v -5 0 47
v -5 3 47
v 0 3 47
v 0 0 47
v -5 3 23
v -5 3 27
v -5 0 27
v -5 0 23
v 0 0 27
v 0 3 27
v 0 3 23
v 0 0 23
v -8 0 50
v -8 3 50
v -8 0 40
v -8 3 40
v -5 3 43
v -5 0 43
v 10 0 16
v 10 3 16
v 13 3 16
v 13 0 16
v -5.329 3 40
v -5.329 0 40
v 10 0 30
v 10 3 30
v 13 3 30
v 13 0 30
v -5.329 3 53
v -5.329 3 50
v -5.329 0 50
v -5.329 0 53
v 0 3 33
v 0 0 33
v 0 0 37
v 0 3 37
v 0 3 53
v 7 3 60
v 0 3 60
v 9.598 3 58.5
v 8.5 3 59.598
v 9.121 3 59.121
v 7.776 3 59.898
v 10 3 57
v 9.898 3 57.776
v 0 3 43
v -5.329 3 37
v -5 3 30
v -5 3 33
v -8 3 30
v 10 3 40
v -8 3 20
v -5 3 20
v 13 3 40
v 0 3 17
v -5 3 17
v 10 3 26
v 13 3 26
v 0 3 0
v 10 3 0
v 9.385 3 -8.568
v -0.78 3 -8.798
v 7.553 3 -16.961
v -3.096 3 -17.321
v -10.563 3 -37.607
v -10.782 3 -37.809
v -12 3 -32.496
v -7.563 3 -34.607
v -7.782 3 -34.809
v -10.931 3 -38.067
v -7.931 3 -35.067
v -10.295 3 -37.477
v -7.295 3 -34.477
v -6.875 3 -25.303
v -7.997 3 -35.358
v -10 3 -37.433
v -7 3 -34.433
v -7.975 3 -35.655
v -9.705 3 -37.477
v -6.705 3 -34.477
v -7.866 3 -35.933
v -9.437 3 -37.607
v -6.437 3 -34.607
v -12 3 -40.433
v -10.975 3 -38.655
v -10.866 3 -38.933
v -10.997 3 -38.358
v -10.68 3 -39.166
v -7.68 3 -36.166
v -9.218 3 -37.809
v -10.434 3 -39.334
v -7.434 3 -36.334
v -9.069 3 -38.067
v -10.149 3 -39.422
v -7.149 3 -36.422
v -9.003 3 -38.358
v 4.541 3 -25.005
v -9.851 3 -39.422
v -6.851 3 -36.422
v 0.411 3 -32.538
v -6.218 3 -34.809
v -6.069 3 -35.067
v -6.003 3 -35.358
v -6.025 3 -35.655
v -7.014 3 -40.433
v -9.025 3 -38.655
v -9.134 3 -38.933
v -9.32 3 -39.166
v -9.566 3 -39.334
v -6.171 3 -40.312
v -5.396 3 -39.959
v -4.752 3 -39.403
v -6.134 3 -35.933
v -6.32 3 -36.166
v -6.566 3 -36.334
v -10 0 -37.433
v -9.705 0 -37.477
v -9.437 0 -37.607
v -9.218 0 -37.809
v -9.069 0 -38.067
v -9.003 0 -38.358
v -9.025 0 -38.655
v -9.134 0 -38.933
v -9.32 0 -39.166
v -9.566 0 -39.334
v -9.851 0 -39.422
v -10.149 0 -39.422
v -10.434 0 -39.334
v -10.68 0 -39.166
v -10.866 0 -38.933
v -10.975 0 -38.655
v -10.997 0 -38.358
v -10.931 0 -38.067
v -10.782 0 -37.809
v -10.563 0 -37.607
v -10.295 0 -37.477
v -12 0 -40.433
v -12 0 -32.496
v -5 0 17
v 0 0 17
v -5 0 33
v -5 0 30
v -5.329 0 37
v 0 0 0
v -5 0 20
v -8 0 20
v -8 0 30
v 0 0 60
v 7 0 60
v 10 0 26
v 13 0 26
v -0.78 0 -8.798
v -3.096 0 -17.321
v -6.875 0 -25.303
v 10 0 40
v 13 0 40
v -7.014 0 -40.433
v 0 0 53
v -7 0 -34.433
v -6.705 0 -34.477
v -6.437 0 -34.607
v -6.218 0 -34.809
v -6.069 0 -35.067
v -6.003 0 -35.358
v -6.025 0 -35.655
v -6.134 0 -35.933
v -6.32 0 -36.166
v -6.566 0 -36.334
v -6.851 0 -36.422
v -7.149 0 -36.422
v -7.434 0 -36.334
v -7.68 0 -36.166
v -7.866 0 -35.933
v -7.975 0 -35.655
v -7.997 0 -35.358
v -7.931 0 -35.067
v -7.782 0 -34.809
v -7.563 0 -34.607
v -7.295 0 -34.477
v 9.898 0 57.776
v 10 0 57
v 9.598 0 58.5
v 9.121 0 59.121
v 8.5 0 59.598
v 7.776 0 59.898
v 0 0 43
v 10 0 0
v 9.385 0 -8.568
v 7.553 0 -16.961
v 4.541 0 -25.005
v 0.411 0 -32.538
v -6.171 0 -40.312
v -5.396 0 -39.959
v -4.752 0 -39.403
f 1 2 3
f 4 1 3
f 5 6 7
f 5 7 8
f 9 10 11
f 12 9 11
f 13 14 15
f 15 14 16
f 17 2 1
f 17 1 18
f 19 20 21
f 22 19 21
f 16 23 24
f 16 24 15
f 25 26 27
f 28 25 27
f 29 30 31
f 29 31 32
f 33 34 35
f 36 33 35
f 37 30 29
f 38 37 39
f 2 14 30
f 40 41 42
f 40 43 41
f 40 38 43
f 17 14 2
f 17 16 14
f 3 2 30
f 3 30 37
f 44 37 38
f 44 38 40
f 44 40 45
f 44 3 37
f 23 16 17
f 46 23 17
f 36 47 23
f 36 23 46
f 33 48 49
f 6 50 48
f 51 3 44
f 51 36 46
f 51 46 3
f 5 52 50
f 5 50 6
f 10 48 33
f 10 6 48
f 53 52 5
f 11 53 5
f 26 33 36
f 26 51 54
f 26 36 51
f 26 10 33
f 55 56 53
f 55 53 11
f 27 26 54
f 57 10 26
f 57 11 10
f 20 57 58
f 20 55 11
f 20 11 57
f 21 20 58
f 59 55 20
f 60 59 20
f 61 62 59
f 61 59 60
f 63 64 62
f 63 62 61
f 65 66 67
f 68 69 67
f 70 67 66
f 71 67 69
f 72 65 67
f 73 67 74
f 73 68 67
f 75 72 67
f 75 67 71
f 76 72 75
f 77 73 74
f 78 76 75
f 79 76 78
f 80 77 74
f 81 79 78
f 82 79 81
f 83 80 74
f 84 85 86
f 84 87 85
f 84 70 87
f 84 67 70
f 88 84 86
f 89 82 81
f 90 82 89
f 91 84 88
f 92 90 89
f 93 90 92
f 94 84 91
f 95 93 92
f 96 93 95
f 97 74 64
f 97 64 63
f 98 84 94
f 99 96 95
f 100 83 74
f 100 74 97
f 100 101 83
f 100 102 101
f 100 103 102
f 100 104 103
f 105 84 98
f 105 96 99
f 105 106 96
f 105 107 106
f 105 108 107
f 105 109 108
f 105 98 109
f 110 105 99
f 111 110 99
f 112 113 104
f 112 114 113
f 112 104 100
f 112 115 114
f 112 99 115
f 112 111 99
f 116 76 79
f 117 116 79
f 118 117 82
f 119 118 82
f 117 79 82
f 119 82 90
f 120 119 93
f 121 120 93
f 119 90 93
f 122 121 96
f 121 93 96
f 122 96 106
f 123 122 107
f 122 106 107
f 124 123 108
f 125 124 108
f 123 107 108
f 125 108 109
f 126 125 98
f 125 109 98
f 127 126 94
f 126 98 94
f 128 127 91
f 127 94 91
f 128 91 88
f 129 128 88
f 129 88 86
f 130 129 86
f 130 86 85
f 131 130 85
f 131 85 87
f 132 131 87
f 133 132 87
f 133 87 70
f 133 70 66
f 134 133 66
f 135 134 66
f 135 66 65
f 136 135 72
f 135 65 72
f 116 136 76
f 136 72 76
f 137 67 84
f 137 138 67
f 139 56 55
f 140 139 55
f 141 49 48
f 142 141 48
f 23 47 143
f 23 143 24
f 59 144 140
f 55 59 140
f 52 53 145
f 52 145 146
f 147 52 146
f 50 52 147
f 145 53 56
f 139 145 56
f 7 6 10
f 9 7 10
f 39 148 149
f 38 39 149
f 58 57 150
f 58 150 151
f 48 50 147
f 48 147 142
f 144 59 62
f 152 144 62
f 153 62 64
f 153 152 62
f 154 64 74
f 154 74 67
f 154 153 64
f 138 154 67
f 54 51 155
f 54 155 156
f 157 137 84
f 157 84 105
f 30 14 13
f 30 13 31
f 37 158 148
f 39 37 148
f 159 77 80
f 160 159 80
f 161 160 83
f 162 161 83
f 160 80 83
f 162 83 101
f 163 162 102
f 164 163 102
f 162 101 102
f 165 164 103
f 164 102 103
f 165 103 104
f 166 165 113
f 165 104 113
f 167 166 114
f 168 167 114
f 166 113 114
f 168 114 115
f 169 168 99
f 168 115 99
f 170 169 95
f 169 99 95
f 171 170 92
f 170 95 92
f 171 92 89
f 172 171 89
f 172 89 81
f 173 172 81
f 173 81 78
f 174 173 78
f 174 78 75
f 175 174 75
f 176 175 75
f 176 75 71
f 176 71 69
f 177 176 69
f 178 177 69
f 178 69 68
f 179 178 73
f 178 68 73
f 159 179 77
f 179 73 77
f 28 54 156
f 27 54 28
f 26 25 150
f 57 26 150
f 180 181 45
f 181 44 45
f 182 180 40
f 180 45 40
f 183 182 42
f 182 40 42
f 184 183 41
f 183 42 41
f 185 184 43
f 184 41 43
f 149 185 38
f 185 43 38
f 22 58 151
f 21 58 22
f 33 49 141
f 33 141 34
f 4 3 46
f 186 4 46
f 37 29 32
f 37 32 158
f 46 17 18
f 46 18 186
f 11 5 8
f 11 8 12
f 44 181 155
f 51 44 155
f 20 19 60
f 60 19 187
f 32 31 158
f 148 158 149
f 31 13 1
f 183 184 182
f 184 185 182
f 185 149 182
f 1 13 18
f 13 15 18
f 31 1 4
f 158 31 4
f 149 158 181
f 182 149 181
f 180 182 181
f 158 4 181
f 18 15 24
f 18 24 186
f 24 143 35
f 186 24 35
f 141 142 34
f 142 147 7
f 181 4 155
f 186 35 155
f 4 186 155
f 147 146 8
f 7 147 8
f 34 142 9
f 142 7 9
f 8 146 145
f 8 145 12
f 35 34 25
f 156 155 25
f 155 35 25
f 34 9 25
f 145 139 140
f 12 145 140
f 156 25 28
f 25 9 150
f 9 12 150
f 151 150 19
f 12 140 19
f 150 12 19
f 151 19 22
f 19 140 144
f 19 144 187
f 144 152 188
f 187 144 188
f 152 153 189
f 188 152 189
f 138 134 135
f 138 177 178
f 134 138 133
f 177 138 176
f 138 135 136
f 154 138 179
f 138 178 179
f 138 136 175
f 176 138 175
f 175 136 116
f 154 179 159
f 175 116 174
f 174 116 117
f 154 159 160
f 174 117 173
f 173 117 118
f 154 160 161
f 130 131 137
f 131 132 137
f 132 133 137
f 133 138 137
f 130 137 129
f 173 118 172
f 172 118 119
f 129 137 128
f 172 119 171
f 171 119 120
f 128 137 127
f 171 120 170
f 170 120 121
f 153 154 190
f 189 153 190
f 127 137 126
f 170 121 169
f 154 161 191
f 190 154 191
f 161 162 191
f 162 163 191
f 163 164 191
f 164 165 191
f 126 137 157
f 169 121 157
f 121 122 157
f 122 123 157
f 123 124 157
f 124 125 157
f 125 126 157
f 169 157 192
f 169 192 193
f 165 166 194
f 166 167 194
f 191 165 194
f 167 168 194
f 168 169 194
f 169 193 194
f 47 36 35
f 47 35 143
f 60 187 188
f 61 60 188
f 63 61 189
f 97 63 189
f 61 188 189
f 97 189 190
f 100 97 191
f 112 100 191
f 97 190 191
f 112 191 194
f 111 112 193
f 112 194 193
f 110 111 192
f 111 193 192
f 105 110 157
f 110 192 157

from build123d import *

# Parameters (mm, degrees)
SKETCH1_R              = 50
BOSS_EXTRUDE1_DEPTH    = 3
SPLIT1_SURFACE_1_BACK  = 170.732
SPLIT1_SURFACE_1_DEPTH = 341.464
SPLIT1_SURFACE_2_BACK  = 170.732
SPLIT1_SURFACE_2_DEPTH = 341.464
BODY_DELETE1_DEPTH     = 3
FILLET1_R              = 3
BOSS_EXTRUDE4_DEPTH    = 3
SPLIT2_SURFACE_3_BACK  = 109.724
SPLIT2_SURFACE_3_DEPTH = 219.448
SPLIT2_SURFACE_4_BACK  = 109.724
SPLIT2_SURFACE_4_DEPTH = 219.448
FILLET2_R              = 3
SKETCH5_R              = 1
CUT_EXTRUDE1_DEPTH     = 3
SKETCH6_W              = 3
SKETCH6_H              = 10
BOSS_EXTRUDE5_DEPTH    = 3
BOSS_EXTRUDE6_DEPTH    = 3
SKETCH8_W              = 5
SKETCH8_H              = 3
BOSS_EXTRUDE7_DEPTH    = 3
SKETCH9_W              = 5
SKETCH9_H              = 4
CUT_EXTRUDE2_DEPTH     = 3


# Read off the part's stored shape, not the designer's step: Body-Delete1
with BuildPart() as part:
    # Sketch1 → Boss-Extrude1 (new body)
    with BuildSketch(Plane(origin=(0, 0, 0), x_dir=(1, 0, 0), z_dir=(0, 1, 0))):
        with BuildLine():
            ThreePointArc((10, 0), (-107.445626465, 17.320508076), (0, -33.166247904))
            Line((0, -33.166247904), (0, -60))
            Line((0, -60), (10, -60))
            Line((10, -60), (10, 0))
        make_face()
        with Locations(Location((-50, 0, 0), (0, 0, 270))):
            Circle(SKETCH1_R, mode=Mode.SUBTRACT)
    extrude(amount=BOSS_EXTRUDE1_DEPTH)


with BuildPart() as body_2:
    # Split1: the piece behind the surface
    add(part.part)
    # Split1 surface: a surface, the sketch's curves swept straight by 341.464 mm
    with BuildLine(Plane(origin=(0, 3, 0), x_dir=(1, 0, 0), z_dir=(0, 1, 0)).offset(-SPLIT1_SURFACE_1_BACK), mode=Mode.PRIVATE) as split1_surface_1_path:
        Line((0, -33.166247904), (0, 0))
        Line((0, 0), (-12, 0))
        Line((-12, 0), (-12, 32.496153619))
        Line((-12, 32.496153619), (-12, 67.159700612))
        Line((-12, 67.159700612), (-127.638562935, 67.159700612))
        Line((-127.638562935, 67.159700612), (-127.638562935, -72.196904976))
        Line((-127.638562935, -72.196904976), (0, -72.196904976))
        Line((0, -72.196904976), (0, -33.166247904))
    split1_surface_1 = Shell.extrude(split1_surface_1_path.wire(), (0 * SPLIT1_SURFACE_1_DEPTH, 1 * SPLIT1_SURFACE_1_DEPTH, 0 * SPLIT1_SURFACE_1_DEPTH))
    split(bisect_by=split1_surface_1, keep=Keep.BOTTOM)

    # Fillet1
    fillet1_edges = [body_2.edges().sort_by_distance(p)[0] for p in [
        (10, 1.5, 60),
    ]]
    fillet(fillet1_edges, radius=FILLET1_R)

    # Sketch3 → Boss-Extrude4 (add)
    with BuildSketch(Plane(origin=(0, 3, 0), x_dir=(1, 0, 0), z_dir=(0, 1, 0))):
        Polygon((0, -50), (-8, -50), (-8, -40), (0, -40), (3, -40), (3, -50), align=None)
        Polygon((-8, -20), (-8, -30), (0, -30), (3, -30), (3, -20), (0, -20), align=None)
    extrude(amount=-BOSS_EXTRUDE4_DEPTH)


with BuildPart() as part_1:
    add(part.part)

    # Split1: split by a surface, the side it looks to stays
    # Split1 surface: a surface, the sketch's curves swept straight by 341.464 mm
    with BuildLine(Plane(origin=(0, 3, 0), x_dir=(1, 0, 0), z_dir=(0, 1, 0)).offset(-SPLIT1_SURFACE_2_BACK), mode=Mode.PRIVATE) as split1_surface_2_path:
        Line((0, -33.166247904), (0, 0))
        Line((0, 0), (-12, 0))
        Line((-12, 0), (-12, 32.496153619))
        Line((-12, 32.496153619), (-12, 67.159700612))
        Line((-12, 67.159700612), (-127.638562935, 67.159700612))
        Line((-127.638562935, 67.159700612), (-127.638562935, -72.196904976))
        Line((-127.638562935, -72.196904976), (0, -72.196904976))
        Line((0, -72.196904976), (0, -33.166247904))
    split1_surface_2 = Shell.extrude(split1_surface_2_path.wire(), (0 * SPLIT1_SURFACE_2_DEPTH, 1 * SPLIT1_SURFACE_2_DEPTH, 0 * SPLIT1_SURFACE_2_DEPTH))
    split(bisect_by=split1_surface_2, keep=Keep.TOP)

    # Body-Delete1 outline → Body-Delete1 (cut)
    with BuildSketch(Plane(origin=(0, 0, 0), x_dir=(1, 0, 0), z_dir=(0, 1, 0))):
        with BuildLine():
            ThreePointArc((-12, 46.432747065), (-109.329587897, -8.94427191), (0, -33.166247904))
            Line((0, -33.166247904), (0, 0))
            ThreePointArc((0, 0), (-96.904157598, -17.320508075), (-12, 32.496153619))
            Line((-12, 32.496153619), (-12, 46.432747065))
        make_face()
    extrude(amount=BODY_DELETE1_DEPTH, mode=Mode.SUBTRACT)


with BuildPart() as body_2_2:
    # Split2: the piece behind the surface
    add(body_2.part)
    # Split2 surface: a surface, the sketch's curves swept straight by 219.448 mm
    with BuildLine(Plane(origin=(0, 3, 0), x_dir=(1, 0, 0), z_dir=(0, 1, 0)).offset(-SPLIT2_SURFACE_3_BACK), mode=Mode.PRIVATE) as split2_surface_3_path:
        Line((-12, 40.432747065), (-5.669502994, 40.432747065))
        Line((-5.669502994, 40.432747065), (-5.042290504, 40.432747065))
        Line((-5.042290504, 40.432747065), (-5.042290504, 47.453598883))
        Line((-5.042290504, 47.453598883), (-14.646815791, 47.453598883))
        Line((-14.646815791, 47.453598883), (-14.646815791, 40.432747065))
        Line((-14.646815791, 40.432747065), (-12, 40.432747065))
    split2_surface_3 = Shell.extrude(split2_surface_3_path.wire(), (0 * SPLIT2_SURFACE_3_DEPTH, 1 * SPLIT2_SURFACE_3_DEPTH, 0 * SPLIT2_SURFACE_3_DEPTH))
    split(bisect_by=split2_surface_3, keep=Keep.BOTTOM)

    # Fillet2
    fillet2_edges = [body_2_2.edges().sort_by_distance(p)[0] for p in [
        (-5.669502994, 1.5, -40.432747065),
    ]]
    fillet(fillet2_edges, radius=FILLET2_R)

    # Sketch5 → Cut-Extrude1 (cut)
    with BuildSketch(Plane(origin=(0, 3, 0), x_dir=(1, 0, 0), z_dir=(0, 1, 0))):
        with Locations(Location((-10, 38.432747065, 0), (0, 0, 270))):
            Circle(SKETCH5_R)
        with Locations(Location((-7, 35.432747065, 0), (0, 0, 270))):
            Circle(SKETCH5_R)
    extrude(amount=-CUT_EXTRUDE1_DEPTH, mode=Mode.SUBTRACT)

    # Sketch6 → Boss-Extrude5 (add)
    with BuildSketch(Plane(origin=(0, 3, 0), x_dir=(1, 0, 0), z_dir=(0, 1, 0))):
        with Locations((11.5, -35)):
            Rectangle(SKETCH6_W, SKETCH6_H)
        with Locations((11.5, -21)):
            Rectangle(SKETCH6_W, SKETCH6_H)
    extrude(amount=-BOSS_EXTRUDE5_DEPTH)

    # Sketch7 → Boss-Extrude6 (add)
    with BuildSketch(Plane(origin=(0, 3, 0), x_dir=(1, 0, 0), z_dir=(0, 1, 0))):
        Polygon((-5.328723834, -40), (-5.328723834, -37), (0, -37), (1.654581998, -37), (1.654581998, -41.537905148), (-0.328723834, -41.537905148), (-5.328723834, -41.537905148), align=None)
        Polygon((-5.328723834, -50), (-5.328723834, -53), (0, -53), (1.654581998, -53), (1.654581998, -47.713051581), (-5.328723834, -47.713051581), align=None)
    extrude(amount=-BOSS_EXTRUDE6_DEPTH)

    # Sketch8 → Boss-Extrude7 (add)
    with BuildSketch(Plane(origin=(0, 3, 0), x_dir=(1, 0, 0), z_dir=(0, 1, 0))):
        with Locations((-2.5, -18.5)):
            Rectangle(SKETCH8_W, SKETCH8_H)
        with Locations((-2.5, -31.5)):
            Rectangle(SKETCH8_W, SKETCH8_H)
    extrude(amount=-BOSS_EXTRUDE7_DEPTH)

    # Sketch9 → Cut-Extrude2 (cut)
    with BuildSketch(Plane(origin=(0, 3, 0), x_dir=(1, 0, 0), z_dir=(0, 1, 0))):
        with Locations((-2.5, -25)):
            Rectangle(SKETCH9_W, SKETCH9_H)
        with Locations((-2.5, -45)):
            Rectangle(SKETCH9_W, SKETCH9_H)
    extrude(amount=-CUT_EXTRUDE2_DEPTH, mode=Mode.SUBTRACT)


with BuildPart() as body_2_1:
    add(body_2.part)

    # Split2: split by a surface, the side it looks to stays
    # Split2 surface: a surface, the sketch's curves swept straight by 219.448 mm
    with BuildLine(Plane(origin=(0, 3, 0), x_dir=(1, 0, 0), z_dir=(0, 1, 0)).offset(-SPLIT2_SURFACE_4_BACK), mode=Mode.PRIVATE) as split2_surface_4_path:
        Line((-12, 40.432747065), (-5.669502994, 40.432747065))
        Line((-5.669502994, 40.432747065), (-5.042290504, 40.432747065))
        Line((-5.042290504, 40.432747065), (-5.042290504, 47.453598883))
        Line((-5.042290504, 47.453598883), (-14.646815791, 47.453598883))
        Line((-14.646815791, 47.453598883), (-14.646815791, 40.432747065))
        Line((-14.646815791, 40.432747065), (-12, 40.432747065))
    split2_surface_4 = Shell.extrude(split2_surface_4_path.wire(), (0 * SPLIT2_SURFACE_4_DEPTH, 1 * SPLIT2_SURFACE_4_DEPTH, 0 * SPLIT2_SURFACE_4_DEPTH))
    split(bisect_by=split2_surface_4, keep=Keep.TOP)


solid = body_2_2.part
